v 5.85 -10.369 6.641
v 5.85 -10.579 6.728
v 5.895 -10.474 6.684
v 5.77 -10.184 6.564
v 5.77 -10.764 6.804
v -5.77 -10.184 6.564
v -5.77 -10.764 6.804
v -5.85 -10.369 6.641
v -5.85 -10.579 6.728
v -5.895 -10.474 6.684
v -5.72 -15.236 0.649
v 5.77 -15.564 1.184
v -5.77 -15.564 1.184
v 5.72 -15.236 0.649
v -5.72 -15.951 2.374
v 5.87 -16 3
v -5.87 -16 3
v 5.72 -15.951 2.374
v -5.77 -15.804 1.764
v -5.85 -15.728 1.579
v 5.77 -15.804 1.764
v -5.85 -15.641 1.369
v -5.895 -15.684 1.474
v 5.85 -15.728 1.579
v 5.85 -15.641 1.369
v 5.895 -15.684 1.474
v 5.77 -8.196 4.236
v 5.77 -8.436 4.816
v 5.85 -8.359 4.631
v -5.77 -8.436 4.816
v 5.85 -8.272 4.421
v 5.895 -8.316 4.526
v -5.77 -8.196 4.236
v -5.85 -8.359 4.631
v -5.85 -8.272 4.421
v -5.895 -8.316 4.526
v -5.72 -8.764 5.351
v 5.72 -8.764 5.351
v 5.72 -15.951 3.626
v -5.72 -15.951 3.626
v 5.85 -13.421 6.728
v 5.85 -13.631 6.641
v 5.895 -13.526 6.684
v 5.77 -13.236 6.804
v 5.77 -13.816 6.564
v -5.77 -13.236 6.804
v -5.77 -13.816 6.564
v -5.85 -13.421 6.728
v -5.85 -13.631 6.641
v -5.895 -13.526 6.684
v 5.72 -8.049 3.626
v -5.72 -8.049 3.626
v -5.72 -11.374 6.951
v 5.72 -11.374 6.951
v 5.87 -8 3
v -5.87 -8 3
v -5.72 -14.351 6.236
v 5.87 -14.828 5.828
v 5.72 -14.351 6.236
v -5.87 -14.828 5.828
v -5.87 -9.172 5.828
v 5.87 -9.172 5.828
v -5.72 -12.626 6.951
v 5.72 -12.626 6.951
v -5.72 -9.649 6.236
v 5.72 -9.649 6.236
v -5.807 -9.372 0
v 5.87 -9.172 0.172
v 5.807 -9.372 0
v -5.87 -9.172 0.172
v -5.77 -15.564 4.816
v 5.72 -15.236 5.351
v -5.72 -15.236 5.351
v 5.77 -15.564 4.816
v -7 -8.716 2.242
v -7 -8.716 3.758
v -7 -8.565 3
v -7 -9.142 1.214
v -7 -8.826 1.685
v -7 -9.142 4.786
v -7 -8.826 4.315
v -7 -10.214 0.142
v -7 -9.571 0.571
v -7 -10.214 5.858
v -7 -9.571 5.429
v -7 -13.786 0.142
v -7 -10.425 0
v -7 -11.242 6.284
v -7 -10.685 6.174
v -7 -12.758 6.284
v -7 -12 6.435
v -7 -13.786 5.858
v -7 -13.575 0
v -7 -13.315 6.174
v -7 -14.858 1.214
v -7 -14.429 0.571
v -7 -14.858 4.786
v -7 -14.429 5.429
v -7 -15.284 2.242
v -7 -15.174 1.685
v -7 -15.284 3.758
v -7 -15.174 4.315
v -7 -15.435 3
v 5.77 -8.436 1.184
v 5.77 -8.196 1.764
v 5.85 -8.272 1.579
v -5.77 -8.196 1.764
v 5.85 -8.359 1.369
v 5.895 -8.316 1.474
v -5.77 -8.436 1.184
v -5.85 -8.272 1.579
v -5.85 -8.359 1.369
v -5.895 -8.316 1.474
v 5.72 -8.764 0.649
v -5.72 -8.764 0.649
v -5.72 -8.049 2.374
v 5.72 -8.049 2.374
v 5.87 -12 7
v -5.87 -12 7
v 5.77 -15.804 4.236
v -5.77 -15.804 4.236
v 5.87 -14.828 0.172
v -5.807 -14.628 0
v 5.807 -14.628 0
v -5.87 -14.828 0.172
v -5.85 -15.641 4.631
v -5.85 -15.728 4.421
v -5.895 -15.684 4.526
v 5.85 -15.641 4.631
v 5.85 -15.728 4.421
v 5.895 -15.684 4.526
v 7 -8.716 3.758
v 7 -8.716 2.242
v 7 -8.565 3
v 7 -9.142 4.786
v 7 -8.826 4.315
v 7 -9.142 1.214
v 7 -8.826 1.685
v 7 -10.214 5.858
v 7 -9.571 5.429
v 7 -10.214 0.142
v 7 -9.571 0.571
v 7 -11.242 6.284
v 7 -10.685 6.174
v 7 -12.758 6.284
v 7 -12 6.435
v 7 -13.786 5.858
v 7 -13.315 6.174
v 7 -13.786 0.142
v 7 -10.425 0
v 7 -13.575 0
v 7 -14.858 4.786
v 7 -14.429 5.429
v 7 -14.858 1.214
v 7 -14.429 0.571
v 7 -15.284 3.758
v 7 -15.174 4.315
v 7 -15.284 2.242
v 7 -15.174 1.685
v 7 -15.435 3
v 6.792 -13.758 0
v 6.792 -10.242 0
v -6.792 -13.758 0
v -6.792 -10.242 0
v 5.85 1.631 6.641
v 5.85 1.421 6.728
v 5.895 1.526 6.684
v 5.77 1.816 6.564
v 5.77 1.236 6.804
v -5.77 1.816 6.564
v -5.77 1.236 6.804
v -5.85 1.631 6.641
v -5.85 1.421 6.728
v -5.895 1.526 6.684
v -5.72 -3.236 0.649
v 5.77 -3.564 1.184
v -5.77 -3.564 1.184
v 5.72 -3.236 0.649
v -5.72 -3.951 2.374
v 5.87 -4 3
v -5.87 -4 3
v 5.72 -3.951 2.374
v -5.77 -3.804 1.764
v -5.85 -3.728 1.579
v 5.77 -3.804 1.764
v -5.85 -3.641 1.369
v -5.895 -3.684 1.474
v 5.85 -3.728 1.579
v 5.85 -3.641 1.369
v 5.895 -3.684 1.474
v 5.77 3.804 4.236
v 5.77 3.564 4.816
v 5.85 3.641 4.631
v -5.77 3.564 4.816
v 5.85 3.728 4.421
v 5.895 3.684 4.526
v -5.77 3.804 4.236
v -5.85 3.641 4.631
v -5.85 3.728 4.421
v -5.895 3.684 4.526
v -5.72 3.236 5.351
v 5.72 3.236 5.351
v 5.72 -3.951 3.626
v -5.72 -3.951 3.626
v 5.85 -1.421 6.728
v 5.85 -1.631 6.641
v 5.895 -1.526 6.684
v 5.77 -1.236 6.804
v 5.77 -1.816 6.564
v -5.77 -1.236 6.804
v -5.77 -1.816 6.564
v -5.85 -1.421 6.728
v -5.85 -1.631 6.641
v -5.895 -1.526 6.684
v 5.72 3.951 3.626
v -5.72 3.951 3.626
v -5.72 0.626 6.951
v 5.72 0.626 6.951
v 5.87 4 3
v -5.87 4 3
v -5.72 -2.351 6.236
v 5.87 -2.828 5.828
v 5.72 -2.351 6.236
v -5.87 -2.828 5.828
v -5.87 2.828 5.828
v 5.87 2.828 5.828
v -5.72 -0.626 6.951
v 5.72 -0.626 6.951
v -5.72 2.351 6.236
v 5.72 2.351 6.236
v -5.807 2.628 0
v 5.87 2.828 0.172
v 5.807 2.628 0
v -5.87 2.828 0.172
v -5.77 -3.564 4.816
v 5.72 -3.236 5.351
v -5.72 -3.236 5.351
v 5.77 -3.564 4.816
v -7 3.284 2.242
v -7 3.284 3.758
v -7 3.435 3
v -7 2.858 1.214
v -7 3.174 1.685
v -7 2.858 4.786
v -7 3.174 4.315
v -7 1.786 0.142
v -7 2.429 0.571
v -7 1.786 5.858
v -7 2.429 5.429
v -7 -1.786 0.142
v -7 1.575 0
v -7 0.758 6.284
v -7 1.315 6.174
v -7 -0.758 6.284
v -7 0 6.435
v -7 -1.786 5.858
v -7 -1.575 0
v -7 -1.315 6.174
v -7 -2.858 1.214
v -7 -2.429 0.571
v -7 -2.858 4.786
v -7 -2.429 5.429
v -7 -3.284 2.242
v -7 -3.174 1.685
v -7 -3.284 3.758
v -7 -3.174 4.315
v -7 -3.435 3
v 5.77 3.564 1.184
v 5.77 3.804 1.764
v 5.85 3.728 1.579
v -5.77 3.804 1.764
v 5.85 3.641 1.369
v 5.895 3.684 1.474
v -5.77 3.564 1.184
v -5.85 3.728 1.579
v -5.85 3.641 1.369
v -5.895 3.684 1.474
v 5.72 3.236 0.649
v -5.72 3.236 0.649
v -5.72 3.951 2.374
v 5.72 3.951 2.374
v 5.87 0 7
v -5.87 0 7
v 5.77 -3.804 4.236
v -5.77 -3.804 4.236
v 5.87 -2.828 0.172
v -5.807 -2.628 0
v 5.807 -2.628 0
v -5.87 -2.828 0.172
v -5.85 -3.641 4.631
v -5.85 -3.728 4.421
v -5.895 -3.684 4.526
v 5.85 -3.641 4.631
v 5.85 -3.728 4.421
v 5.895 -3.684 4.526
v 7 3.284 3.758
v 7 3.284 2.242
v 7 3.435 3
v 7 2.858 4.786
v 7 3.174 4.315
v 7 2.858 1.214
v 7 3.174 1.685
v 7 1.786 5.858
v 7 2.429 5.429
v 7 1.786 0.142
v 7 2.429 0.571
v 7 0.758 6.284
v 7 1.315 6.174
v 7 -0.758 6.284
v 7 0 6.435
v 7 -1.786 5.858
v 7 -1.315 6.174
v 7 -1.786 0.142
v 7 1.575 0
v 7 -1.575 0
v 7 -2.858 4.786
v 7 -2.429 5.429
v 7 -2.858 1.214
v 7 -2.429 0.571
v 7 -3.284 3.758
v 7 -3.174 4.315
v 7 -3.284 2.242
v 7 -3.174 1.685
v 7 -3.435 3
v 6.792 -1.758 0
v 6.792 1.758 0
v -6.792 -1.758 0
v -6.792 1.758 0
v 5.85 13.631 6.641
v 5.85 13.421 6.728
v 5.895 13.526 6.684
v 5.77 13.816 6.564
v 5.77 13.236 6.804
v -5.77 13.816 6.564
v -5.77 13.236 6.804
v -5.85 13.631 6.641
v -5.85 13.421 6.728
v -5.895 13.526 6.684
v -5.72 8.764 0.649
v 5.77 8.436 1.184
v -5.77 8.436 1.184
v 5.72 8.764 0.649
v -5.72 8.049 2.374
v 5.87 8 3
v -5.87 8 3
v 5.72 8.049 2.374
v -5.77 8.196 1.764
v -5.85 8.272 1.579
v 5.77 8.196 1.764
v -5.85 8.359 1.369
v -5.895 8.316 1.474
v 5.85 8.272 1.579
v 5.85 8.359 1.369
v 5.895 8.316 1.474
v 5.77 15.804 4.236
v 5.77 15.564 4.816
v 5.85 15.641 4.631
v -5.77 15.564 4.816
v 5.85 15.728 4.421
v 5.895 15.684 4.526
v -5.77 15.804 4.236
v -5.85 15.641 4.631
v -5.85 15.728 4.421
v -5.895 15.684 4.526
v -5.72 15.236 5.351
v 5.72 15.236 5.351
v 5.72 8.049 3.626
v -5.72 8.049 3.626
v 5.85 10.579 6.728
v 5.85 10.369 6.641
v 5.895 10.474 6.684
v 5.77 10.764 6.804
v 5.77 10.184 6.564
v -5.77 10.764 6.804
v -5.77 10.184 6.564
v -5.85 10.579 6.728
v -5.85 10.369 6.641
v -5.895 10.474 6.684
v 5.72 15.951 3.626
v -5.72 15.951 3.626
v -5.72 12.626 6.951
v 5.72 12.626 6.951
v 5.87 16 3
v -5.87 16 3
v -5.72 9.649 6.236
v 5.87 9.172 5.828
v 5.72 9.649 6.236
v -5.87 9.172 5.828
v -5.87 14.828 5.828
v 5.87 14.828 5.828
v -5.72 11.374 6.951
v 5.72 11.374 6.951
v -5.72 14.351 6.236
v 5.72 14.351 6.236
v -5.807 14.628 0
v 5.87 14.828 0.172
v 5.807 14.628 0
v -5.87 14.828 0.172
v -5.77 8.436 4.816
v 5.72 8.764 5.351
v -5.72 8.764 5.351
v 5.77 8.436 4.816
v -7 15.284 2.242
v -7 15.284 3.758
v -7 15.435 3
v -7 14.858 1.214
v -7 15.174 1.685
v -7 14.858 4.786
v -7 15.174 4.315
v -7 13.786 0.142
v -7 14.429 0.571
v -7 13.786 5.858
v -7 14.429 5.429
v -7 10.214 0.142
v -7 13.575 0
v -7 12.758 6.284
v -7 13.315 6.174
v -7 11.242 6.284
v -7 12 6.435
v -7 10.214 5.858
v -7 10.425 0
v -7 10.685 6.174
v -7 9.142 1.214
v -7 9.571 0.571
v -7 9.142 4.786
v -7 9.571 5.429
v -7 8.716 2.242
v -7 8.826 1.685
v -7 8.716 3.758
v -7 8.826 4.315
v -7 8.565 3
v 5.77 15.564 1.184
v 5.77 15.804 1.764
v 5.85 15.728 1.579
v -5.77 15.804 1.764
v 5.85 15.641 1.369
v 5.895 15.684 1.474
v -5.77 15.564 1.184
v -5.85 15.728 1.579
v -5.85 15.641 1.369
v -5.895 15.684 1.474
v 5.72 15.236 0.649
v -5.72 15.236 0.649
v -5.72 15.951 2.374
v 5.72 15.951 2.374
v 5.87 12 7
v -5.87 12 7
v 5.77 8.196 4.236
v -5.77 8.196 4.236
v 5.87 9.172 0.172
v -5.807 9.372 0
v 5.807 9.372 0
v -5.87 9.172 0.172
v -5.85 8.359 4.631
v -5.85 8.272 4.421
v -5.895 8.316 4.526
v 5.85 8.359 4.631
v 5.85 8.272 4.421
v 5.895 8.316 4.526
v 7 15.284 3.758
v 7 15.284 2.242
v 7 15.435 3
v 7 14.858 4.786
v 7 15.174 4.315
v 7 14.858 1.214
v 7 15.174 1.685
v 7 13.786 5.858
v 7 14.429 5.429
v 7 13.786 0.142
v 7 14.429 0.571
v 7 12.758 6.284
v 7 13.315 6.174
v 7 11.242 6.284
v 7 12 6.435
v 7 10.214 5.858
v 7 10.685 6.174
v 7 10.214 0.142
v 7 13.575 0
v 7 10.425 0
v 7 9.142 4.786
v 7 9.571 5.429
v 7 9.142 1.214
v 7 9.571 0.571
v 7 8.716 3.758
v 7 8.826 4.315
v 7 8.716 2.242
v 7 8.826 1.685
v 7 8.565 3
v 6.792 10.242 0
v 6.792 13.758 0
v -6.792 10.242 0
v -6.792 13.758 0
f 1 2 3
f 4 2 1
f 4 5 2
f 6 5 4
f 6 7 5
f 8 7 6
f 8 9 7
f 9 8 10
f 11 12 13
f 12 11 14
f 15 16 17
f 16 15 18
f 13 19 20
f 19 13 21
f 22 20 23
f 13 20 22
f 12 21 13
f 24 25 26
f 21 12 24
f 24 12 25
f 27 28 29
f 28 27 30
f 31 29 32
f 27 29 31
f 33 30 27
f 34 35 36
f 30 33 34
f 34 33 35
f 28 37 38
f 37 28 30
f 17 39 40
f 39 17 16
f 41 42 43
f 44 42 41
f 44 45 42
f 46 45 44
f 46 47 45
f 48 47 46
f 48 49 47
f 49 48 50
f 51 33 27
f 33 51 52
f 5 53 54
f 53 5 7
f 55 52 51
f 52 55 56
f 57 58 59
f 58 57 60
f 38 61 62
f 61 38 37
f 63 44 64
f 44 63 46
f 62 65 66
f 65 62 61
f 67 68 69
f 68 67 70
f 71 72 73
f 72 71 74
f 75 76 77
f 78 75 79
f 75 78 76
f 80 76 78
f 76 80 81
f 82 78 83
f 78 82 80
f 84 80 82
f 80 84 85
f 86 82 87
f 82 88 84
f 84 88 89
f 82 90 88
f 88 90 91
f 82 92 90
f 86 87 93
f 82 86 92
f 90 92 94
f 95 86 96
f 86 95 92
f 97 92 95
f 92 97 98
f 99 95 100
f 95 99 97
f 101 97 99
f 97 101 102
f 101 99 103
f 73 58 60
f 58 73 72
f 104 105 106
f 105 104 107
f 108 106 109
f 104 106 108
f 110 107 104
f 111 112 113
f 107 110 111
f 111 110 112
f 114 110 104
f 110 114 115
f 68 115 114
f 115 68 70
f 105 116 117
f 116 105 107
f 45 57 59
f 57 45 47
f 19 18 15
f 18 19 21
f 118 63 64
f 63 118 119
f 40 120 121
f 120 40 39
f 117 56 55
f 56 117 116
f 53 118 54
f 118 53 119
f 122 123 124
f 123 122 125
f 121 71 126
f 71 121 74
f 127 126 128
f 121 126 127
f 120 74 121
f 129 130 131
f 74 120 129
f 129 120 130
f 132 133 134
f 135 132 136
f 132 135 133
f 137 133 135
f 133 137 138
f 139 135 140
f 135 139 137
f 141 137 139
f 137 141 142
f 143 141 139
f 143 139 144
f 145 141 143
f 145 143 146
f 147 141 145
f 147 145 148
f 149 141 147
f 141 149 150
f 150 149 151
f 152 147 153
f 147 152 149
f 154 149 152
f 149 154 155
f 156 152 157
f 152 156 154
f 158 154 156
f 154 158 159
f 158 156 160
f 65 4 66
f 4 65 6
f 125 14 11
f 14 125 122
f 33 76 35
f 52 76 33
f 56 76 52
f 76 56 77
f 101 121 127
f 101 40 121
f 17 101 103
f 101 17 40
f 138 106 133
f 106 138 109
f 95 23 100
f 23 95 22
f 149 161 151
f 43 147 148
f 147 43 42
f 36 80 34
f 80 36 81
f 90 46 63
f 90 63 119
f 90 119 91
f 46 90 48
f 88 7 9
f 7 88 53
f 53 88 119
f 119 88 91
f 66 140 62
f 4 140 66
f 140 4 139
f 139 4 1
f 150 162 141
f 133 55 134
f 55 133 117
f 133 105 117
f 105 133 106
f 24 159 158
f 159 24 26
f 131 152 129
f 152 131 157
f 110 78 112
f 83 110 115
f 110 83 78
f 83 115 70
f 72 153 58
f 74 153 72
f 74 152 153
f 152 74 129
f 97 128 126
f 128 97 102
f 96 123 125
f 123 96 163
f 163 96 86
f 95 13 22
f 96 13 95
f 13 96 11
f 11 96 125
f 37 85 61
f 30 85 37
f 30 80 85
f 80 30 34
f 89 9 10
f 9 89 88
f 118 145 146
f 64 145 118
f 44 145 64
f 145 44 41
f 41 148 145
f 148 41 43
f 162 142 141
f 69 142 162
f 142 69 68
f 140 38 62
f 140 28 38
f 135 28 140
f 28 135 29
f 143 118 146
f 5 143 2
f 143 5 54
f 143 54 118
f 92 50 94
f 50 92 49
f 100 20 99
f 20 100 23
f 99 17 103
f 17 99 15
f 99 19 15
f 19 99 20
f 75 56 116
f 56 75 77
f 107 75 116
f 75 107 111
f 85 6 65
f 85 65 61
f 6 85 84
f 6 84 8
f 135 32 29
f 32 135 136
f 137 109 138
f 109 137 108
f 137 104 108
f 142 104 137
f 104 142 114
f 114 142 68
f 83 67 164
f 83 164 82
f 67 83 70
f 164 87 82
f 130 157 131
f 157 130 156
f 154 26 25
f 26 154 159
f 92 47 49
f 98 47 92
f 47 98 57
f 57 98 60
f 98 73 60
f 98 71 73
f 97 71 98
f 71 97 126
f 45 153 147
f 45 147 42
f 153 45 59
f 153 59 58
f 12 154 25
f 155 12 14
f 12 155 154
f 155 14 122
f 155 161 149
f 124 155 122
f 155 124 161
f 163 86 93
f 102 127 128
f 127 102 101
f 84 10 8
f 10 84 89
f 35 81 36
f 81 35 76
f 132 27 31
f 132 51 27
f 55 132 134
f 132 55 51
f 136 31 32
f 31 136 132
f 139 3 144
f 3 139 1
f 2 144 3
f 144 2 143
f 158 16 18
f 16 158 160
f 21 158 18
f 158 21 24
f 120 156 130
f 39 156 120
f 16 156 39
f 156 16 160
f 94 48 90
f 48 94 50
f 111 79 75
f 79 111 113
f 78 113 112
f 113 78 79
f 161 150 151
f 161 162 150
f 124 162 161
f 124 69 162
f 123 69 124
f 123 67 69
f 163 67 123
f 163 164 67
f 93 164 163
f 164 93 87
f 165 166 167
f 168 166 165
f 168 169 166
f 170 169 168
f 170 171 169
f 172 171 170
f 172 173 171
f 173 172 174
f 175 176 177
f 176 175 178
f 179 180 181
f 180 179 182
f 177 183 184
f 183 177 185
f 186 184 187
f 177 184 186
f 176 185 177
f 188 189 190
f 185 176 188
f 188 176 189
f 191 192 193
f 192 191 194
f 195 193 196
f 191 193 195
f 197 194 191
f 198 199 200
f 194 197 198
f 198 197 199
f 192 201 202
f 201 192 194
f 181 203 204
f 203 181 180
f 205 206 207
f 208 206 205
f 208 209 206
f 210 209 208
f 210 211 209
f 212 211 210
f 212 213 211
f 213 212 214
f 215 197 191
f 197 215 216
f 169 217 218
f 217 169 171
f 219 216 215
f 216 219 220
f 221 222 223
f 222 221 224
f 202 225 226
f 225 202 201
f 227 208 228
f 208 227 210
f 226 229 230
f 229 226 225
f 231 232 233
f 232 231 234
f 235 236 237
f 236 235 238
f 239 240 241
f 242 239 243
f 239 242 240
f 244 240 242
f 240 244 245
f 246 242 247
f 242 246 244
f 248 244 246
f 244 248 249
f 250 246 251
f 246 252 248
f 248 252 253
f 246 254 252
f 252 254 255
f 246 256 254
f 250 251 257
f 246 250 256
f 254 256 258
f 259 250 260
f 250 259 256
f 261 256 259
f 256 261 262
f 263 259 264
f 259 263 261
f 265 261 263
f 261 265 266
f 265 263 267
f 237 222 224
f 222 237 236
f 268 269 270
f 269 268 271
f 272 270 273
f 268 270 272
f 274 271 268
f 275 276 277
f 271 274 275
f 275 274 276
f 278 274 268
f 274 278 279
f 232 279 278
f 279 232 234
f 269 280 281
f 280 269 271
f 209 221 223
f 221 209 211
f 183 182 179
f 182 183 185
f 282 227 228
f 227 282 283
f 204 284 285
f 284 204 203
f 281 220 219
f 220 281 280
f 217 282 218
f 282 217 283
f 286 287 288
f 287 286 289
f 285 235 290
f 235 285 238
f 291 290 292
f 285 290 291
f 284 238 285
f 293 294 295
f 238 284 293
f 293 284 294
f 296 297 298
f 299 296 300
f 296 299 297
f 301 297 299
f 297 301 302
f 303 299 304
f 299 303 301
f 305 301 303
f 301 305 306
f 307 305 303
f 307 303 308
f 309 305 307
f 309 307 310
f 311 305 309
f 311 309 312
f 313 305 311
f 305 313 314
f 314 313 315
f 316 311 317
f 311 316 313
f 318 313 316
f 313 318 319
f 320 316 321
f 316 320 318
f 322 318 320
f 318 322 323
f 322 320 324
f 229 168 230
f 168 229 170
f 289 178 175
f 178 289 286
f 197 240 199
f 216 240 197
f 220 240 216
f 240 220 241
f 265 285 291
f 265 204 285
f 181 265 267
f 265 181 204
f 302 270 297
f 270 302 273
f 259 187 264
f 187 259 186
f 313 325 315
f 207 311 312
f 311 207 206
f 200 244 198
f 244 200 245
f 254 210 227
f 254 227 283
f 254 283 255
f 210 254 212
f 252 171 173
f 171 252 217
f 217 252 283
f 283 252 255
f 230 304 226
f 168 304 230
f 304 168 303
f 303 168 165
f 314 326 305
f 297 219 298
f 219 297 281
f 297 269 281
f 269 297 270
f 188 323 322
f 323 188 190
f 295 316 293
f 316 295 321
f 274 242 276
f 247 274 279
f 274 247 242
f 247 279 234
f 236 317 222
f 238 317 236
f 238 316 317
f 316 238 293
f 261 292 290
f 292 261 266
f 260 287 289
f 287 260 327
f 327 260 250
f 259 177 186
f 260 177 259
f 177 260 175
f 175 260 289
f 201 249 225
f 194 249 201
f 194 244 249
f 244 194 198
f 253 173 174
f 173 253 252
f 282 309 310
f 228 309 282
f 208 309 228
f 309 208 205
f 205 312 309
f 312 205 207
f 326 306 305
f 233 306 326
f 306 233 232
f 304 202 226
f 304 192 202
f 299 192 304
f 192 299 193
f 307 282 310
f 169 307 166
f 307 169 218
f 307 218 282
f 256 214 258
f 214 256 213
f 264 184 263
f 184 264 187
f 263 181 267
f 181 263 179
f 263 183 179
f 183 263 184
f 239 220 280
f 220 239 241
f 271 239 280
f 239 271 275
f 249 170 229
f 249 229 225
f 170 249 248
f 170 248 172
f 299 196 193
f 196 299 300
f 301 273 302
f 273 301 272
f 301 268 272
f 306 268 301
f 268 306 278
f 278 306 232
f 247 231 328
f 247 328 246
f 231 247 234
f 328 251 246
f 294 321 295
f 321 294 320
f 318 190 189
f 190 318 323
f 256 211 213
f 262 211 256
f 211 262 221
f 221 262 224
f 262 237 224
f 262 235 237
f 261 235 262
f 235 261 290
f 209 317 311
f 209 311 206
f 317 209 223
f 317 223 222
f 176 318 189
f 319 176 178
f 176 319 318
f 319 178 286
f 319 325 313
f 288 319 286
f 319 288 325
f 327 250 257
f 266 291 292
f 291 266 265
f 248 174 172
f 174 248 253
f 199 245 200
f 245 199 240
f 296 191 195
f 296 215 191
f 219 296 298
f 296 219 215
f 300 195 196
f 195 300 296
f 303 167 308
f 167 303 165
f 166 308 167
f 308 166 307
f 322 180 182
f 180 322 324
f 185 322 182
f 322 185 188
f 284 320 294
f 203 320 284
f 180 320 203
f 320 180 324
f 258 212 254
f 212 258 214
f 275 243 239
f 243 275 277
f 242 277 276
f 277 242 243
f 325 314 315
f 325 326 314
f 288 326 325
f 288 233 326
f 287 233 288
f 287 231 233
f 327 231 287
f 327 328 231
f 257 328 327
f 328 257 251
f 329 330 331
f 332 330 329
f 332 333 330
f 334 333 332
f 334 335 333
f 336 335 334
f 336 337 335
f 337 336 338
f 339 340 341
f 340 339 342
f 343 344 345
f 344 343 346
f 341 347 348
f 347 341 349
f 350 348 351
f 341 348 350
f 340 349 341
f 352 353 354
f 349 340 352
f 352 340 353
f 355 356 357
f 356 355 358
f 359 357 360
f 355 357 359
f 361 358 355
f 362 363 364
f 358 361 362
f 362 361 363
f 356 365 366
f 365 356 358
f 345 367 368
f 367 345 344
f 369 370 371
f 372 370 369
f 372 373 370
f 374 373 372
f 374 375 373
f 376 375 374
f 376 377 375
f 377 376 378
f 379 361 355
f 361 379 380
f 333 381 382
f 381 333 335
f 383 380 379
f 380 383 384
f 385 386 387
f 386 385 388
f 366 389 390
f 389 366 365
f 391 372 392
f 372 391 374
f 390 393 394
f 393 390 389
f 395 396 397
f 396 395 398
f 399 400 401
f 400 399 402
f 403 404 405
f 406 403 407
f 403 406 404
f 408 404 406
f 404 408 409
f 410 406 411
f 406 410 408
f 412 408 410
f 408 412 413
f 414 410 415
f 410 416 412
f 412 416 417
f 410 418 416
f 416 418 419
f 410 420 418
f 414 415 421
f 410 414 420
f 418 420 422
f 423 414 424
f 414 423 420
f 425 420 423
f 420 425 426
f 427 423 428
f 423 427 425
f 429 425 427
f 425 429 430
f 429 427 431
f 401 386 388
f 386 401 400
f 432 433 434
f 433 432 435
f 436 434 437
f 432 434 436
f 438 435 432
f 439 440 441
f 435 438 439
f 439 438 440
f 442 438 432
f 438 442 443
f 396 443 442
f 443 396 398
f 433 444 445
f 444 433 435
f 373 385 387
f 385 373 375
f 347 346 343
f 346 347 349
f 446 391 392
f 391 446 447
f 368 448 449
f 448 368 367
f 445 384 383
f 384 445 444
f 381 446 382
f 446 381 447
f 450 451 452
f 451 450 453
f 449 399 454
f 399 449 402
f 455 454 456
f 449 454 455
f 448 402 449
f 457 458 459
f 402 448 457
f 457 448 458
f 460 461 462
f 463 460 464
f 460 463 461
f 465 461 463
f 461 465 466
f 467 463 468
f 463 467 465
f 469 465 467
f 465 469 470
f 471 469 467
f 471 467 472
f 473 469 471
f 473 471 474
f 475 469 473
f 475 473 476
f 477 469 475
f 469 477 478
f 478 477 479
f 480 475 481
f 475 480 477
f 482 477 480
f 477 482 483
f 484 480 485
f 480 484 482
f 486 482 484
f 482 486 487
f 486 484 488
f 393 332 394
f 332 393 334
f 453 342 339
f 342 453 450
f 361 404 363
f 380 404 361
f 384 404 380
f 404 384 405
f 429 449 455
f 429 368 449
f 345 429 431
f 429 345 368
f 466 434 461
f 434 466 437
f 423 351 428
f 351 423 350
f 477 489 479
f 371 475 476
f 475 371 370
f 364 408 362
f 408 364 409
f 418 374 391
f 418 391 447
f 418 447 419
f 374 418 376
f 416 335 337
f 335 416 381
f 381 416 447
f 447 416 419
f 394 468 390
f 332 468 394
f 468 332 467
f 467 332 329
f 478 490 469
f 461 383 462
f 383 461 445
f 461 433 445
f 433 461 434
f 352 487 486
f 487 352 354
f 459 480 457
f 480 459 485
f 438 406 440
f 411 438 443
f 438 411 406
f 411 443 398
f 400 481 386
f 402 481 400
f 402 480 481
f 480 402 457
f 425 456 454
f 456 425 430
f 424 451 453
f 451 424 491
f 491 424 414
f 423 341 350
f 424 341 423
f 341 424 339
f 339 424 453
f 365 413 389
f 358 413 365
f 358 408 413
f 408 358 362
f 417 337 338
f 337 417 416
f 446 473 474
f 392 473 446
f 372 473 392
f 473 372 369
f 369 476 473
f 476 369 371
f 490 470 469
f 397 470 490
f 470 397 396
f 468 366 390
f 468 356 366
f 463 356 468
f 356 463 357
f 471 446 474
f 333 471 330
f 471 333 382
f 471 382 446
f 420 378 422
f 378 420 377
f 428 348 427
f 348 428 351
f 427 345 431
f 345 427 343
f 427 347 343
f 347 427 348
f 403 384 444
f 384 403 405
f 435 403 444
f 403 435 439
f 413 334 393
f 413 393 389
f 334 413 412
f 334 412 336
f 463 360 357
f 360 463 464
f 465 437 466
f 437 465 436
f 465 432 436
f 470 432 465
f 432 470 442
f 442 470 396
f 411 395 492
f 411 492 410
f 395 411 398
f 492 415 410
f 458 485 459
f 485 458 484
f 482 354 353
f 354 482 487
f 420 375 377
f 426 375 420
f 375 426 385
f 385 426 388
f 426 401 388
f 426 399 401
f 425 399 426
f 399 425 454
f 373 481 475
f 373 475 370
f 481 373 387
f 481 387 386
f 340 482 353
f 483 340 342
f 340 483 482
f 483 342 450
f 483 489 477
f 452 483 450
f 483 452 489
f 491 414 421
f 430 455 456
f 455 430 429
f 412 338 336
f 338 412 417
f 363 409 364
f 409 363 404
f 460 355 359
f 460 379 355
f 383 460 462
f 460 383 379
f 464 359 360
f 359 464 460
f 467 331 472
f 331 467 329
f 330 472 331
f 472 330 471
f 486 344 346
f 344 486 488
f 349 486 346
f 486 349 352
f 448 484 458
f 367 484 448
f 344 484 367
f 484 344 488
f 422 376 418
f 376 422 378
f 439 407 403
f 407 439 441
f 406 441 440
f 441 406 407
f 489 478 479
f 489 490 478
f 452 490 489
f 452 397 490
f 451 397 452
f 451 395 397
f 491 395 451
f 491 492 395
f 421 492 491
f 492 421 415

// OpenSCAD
module tensioner_axle() {
  difference() {
    translate([0, 0, 3]) rotate([0, 90, 0]) intersection() {
      cylinder(r=4, h=14, center=true, $fn=40);
      scale([1, 1, 2]) sphere(r=5);
    }
    // Flat bottom for print surface.
    translate([0, 0, -10]) cube([20, 20, 20], center=true);
  }
}

// Print three axles at once to allow enough cooling time for each layer.
for (y = [-1:1]) {
  translate([0, y*12, 0]) tensioner_axle();
}
